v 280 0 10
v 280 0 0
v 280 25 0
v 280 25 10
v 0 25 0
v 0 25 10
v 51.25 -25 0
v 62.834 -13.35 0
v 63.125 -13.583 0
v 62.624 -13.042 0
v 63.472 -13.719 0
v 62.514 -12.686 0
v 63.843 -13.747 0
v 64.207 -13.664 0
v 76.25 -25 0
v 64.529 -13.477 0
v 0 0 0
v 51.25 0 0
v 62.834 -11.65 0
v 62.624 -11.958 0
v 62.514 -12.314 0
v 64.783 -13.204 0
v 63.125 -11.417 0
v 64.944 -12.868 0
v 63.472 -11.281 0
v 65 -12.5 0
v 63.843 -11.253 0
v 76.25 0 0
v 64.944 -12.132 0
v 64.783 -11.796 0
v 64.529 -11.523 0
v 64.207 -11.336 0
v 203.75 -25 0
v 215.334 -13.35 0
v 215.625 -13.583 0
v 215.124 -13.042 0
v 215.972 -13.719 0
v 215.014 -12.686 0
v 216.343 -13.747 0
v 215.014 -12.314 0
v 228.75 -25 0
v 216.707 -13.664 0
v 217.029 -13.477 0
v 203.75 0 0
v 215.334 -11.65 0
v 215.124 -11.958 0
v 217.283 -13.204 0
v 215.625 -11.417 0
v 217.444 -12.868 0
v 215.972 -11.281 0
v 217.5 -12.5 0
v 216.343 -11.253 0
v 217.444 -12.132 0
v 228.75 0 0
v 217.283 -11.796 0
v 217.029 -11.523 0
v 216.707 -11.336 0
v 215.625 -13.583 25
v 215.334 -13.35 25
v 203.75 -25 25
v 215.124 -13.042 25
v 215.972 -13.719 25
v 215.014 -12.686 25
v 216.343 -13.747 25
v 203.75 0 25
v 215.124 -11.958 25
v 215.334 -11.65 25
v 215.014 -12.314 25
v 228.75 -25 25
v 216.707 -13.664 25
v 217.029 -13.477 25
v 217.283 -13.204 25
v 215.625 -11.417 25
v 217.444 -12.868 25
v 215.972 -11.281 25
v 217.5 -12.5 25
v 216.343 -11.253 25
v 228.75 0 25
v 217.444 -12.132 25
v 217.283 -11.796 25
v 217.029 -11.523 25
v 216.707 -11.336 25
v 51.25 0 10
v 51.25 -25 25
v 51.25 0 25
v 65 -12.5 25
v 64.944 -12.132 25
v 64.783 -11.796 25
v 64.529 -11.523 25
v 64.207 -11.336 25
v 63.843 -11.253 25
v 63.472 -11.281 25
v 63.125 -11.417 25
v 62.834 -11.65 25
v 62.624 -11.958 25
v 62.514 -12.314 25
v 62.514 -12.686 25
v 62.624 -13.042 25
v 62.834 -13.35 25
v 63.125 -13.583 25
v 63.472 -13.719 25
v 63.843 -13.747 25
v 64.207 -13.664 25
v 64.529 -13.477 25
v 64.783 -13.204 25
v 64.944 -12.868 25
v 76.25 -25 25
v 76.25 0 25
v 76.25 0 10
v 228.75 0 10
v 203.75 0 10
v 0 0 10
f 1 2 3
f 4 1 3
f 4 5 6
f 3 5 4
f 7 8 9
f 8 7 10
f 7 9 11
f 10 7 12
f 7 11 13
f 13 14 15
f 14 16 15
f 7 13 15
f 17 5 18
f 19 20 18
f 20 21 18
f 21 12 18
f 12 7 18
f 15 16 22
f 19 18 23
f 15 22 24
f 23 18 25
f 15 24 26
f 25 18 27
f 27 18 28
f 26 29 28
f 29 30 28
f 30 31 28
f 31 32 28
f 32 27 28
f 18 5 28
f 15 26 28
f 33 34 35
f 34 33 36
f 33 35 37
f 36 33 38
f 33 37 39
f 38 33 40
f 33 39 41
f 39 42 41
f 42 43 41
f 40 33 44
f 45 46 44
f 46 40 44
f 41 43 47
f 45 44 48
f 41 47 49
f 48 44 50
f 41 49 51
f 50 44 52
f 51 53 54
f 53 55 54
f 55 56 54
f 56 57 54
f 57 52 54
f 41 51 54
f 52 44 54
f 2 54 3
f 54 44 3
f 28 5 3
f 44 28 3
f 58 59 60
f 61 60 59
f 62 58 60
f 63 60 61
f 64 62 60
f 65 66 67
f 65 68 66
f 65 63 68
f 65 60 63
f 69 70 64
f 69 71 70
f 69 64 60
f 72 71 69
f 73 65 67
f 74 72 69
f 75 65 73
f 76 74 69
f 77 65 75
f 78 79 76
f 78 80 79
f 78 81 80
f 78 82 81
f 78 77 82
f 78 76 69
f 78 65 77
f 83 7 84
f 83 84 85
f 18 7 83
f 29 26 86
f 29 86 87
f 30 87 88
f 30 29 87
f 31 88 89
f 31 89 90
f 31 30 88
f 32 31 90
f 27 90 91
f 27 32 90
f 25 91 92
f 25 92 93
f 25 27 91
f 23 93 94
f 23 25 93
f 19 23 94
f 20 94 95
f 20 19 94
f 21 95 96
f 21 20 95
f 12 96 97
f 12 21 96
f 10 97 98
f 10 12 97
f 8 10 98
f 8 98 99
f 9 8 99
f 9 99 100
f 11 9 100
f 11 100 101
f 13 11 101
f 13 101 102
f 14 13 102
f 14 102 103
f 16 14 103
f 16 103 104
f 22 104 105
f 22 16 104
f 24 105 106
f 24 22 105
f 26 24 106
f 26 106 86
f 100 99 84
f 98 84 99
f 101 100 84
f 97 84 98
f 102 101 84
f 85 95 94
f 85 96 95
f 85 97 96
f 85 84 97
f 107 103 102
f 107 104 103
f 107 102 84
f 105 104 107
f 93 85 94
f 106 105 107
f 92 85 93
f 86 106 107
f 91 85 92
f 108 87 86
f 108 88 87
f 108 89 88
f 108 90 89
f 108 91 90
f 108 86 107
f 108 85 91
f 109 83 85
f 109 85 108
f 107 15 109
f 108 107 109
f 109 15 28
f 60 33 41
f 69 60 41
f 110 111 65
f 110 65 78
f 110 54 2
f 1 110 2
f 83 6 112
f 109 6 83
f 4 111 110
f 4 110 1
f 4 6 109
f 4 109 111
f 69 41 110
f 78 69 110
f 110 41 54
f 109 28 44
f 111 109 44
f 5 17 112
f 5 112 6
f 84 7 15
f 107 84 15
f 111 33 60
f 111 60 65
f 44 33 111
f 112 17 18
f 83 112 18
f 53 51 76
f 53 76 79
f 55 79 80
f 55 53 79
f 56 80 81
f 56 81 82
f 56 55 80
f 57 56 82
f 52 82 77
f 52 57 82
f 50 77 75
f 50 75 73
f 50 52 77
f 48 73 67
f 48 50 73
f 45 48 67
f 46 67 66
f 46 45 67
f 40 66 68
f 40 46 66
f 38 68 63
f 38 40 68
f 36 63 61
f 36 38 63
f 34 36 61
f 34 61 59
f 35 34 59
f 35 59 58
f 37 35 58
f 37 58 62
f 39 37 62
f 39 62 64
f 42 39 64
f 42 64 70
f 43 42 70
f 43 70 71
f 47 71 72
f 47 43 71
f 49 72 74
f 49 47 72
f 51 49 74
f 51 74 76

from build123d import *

# Parameters (mm, degrees)
ESQUISSE1_W        = 25
ESQUISSE1_H        = 25
ESQUISSE1_R        = 1.25
BOSS_EXTRU_2_DEPTH = 25
ESQUISSE1_5_W      = 25
ESQUISSE1_5_H      = 25
ESQUISSE1_5_R      = 1.25
BOSS_EXTRU_3_DEPTH = 25
BOSS_EXTRU_4_DEPTH = 10


with BuildPart() as part:
    # Esquisse1 → Boss.-Extru.2 (new body)
    with BuildSketch(Plane.XY):
        with Locations((63.75, -12.5)):
            Rectangle(ESQUISSE1_W, ESQUISSE1_H)
        with Locations((63.75, -12.5)):
            Circle(ESQUISSE1_R, mode=Mode.SUBTRACT)
    extrude(amount=BOSS_EXTRU_2_DEPTH)



with BuildPart() as body_2:
    # Esquisse1<5> → Boss.-Extru.3 (new body)
    with BuildSketch(Plane.XY):
        with Locations((216.25, -12.5)):
            Rectangle(ESQUISSE1_5_W, ESQUISSE1_5_H)
        with Locations((216.25, -12.5)):
            Circle(ESQUISSE1_5_R, mode=Mode.SUBTRACT)
    extrude(amount=BOSS_EXTRU_3_DEPTH)


with BuildPart() as part_1:
    add(part.part)

    add(body_2.part)  # Boss.-Extru.4 merges body 2
    # Esquisse1<7> → Boss.-Extru.4 (add)
    with BuildSketch(Plane.XY):
        Polygon((0, 25), (0, 0), (51.25, 0), (76.25, 0), (203.75, 0), (228.75, 0), (280, 0), (280, 25), align=None)
    extrude(amount=BOSS_EXTRU_4_DEPTH)


solid = part_1.part
